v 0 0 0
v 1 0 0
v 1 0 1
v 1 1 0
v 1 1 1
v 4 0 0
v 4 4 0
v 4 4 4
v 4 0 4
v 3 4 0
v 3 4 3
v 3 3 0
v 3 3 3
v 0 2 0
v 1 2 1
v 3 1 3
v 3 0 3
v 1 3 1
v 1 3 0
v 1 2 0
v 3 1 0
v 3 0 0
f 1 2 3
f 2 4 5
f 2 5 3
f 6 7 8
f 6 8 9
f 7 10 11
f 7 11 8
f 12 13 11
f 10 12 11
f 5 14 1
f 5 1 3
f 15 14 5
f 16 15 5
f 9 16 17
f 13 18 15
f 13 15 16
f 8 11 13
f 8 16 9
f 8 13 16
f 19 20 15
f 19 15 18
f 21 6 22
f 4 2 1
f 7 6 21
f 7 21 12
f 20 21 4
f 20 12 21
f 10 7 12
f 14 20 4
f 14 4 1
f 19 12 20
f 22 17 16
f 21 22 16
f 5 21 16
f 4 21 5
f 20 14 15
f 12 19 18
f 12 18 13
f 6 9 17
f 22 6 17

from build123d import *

# Parameters (mm, degrees)
BOSS_EXTRUDE1_DEPTH = 4
CUT_EXTRUDE1_DEPTH  = 10


with BuildPart() as part:
    # Sketch1 → Boss-Extrude1 (new body)
    with BuildSketch(Plane.XY):
        Polygon((0, 0), (0, 2), (1, 2), (1, 3), (3, 3), (3, 4), (4, 4), (4, 0), (3, 0), (3, 1), (1, 1), (1, 0), align=None)
    extrude(amount=BOSS_EXTRUDE1_DEPTH)

    # Sketch2 → Cut-Extrude1 (cut)
    with BuildSketch(Plane(origin=(0, 4, 0), x_dir=(1, 0, 0), z_dir=(0, 1, 0))):
        Polygon((0, 0), (4, -4), (0, -4), align=None)
    extrude(amount=-CUT_EXTRUDE1_DEPTH, mode=Mode.SUBTRACT)


solid = part.part
